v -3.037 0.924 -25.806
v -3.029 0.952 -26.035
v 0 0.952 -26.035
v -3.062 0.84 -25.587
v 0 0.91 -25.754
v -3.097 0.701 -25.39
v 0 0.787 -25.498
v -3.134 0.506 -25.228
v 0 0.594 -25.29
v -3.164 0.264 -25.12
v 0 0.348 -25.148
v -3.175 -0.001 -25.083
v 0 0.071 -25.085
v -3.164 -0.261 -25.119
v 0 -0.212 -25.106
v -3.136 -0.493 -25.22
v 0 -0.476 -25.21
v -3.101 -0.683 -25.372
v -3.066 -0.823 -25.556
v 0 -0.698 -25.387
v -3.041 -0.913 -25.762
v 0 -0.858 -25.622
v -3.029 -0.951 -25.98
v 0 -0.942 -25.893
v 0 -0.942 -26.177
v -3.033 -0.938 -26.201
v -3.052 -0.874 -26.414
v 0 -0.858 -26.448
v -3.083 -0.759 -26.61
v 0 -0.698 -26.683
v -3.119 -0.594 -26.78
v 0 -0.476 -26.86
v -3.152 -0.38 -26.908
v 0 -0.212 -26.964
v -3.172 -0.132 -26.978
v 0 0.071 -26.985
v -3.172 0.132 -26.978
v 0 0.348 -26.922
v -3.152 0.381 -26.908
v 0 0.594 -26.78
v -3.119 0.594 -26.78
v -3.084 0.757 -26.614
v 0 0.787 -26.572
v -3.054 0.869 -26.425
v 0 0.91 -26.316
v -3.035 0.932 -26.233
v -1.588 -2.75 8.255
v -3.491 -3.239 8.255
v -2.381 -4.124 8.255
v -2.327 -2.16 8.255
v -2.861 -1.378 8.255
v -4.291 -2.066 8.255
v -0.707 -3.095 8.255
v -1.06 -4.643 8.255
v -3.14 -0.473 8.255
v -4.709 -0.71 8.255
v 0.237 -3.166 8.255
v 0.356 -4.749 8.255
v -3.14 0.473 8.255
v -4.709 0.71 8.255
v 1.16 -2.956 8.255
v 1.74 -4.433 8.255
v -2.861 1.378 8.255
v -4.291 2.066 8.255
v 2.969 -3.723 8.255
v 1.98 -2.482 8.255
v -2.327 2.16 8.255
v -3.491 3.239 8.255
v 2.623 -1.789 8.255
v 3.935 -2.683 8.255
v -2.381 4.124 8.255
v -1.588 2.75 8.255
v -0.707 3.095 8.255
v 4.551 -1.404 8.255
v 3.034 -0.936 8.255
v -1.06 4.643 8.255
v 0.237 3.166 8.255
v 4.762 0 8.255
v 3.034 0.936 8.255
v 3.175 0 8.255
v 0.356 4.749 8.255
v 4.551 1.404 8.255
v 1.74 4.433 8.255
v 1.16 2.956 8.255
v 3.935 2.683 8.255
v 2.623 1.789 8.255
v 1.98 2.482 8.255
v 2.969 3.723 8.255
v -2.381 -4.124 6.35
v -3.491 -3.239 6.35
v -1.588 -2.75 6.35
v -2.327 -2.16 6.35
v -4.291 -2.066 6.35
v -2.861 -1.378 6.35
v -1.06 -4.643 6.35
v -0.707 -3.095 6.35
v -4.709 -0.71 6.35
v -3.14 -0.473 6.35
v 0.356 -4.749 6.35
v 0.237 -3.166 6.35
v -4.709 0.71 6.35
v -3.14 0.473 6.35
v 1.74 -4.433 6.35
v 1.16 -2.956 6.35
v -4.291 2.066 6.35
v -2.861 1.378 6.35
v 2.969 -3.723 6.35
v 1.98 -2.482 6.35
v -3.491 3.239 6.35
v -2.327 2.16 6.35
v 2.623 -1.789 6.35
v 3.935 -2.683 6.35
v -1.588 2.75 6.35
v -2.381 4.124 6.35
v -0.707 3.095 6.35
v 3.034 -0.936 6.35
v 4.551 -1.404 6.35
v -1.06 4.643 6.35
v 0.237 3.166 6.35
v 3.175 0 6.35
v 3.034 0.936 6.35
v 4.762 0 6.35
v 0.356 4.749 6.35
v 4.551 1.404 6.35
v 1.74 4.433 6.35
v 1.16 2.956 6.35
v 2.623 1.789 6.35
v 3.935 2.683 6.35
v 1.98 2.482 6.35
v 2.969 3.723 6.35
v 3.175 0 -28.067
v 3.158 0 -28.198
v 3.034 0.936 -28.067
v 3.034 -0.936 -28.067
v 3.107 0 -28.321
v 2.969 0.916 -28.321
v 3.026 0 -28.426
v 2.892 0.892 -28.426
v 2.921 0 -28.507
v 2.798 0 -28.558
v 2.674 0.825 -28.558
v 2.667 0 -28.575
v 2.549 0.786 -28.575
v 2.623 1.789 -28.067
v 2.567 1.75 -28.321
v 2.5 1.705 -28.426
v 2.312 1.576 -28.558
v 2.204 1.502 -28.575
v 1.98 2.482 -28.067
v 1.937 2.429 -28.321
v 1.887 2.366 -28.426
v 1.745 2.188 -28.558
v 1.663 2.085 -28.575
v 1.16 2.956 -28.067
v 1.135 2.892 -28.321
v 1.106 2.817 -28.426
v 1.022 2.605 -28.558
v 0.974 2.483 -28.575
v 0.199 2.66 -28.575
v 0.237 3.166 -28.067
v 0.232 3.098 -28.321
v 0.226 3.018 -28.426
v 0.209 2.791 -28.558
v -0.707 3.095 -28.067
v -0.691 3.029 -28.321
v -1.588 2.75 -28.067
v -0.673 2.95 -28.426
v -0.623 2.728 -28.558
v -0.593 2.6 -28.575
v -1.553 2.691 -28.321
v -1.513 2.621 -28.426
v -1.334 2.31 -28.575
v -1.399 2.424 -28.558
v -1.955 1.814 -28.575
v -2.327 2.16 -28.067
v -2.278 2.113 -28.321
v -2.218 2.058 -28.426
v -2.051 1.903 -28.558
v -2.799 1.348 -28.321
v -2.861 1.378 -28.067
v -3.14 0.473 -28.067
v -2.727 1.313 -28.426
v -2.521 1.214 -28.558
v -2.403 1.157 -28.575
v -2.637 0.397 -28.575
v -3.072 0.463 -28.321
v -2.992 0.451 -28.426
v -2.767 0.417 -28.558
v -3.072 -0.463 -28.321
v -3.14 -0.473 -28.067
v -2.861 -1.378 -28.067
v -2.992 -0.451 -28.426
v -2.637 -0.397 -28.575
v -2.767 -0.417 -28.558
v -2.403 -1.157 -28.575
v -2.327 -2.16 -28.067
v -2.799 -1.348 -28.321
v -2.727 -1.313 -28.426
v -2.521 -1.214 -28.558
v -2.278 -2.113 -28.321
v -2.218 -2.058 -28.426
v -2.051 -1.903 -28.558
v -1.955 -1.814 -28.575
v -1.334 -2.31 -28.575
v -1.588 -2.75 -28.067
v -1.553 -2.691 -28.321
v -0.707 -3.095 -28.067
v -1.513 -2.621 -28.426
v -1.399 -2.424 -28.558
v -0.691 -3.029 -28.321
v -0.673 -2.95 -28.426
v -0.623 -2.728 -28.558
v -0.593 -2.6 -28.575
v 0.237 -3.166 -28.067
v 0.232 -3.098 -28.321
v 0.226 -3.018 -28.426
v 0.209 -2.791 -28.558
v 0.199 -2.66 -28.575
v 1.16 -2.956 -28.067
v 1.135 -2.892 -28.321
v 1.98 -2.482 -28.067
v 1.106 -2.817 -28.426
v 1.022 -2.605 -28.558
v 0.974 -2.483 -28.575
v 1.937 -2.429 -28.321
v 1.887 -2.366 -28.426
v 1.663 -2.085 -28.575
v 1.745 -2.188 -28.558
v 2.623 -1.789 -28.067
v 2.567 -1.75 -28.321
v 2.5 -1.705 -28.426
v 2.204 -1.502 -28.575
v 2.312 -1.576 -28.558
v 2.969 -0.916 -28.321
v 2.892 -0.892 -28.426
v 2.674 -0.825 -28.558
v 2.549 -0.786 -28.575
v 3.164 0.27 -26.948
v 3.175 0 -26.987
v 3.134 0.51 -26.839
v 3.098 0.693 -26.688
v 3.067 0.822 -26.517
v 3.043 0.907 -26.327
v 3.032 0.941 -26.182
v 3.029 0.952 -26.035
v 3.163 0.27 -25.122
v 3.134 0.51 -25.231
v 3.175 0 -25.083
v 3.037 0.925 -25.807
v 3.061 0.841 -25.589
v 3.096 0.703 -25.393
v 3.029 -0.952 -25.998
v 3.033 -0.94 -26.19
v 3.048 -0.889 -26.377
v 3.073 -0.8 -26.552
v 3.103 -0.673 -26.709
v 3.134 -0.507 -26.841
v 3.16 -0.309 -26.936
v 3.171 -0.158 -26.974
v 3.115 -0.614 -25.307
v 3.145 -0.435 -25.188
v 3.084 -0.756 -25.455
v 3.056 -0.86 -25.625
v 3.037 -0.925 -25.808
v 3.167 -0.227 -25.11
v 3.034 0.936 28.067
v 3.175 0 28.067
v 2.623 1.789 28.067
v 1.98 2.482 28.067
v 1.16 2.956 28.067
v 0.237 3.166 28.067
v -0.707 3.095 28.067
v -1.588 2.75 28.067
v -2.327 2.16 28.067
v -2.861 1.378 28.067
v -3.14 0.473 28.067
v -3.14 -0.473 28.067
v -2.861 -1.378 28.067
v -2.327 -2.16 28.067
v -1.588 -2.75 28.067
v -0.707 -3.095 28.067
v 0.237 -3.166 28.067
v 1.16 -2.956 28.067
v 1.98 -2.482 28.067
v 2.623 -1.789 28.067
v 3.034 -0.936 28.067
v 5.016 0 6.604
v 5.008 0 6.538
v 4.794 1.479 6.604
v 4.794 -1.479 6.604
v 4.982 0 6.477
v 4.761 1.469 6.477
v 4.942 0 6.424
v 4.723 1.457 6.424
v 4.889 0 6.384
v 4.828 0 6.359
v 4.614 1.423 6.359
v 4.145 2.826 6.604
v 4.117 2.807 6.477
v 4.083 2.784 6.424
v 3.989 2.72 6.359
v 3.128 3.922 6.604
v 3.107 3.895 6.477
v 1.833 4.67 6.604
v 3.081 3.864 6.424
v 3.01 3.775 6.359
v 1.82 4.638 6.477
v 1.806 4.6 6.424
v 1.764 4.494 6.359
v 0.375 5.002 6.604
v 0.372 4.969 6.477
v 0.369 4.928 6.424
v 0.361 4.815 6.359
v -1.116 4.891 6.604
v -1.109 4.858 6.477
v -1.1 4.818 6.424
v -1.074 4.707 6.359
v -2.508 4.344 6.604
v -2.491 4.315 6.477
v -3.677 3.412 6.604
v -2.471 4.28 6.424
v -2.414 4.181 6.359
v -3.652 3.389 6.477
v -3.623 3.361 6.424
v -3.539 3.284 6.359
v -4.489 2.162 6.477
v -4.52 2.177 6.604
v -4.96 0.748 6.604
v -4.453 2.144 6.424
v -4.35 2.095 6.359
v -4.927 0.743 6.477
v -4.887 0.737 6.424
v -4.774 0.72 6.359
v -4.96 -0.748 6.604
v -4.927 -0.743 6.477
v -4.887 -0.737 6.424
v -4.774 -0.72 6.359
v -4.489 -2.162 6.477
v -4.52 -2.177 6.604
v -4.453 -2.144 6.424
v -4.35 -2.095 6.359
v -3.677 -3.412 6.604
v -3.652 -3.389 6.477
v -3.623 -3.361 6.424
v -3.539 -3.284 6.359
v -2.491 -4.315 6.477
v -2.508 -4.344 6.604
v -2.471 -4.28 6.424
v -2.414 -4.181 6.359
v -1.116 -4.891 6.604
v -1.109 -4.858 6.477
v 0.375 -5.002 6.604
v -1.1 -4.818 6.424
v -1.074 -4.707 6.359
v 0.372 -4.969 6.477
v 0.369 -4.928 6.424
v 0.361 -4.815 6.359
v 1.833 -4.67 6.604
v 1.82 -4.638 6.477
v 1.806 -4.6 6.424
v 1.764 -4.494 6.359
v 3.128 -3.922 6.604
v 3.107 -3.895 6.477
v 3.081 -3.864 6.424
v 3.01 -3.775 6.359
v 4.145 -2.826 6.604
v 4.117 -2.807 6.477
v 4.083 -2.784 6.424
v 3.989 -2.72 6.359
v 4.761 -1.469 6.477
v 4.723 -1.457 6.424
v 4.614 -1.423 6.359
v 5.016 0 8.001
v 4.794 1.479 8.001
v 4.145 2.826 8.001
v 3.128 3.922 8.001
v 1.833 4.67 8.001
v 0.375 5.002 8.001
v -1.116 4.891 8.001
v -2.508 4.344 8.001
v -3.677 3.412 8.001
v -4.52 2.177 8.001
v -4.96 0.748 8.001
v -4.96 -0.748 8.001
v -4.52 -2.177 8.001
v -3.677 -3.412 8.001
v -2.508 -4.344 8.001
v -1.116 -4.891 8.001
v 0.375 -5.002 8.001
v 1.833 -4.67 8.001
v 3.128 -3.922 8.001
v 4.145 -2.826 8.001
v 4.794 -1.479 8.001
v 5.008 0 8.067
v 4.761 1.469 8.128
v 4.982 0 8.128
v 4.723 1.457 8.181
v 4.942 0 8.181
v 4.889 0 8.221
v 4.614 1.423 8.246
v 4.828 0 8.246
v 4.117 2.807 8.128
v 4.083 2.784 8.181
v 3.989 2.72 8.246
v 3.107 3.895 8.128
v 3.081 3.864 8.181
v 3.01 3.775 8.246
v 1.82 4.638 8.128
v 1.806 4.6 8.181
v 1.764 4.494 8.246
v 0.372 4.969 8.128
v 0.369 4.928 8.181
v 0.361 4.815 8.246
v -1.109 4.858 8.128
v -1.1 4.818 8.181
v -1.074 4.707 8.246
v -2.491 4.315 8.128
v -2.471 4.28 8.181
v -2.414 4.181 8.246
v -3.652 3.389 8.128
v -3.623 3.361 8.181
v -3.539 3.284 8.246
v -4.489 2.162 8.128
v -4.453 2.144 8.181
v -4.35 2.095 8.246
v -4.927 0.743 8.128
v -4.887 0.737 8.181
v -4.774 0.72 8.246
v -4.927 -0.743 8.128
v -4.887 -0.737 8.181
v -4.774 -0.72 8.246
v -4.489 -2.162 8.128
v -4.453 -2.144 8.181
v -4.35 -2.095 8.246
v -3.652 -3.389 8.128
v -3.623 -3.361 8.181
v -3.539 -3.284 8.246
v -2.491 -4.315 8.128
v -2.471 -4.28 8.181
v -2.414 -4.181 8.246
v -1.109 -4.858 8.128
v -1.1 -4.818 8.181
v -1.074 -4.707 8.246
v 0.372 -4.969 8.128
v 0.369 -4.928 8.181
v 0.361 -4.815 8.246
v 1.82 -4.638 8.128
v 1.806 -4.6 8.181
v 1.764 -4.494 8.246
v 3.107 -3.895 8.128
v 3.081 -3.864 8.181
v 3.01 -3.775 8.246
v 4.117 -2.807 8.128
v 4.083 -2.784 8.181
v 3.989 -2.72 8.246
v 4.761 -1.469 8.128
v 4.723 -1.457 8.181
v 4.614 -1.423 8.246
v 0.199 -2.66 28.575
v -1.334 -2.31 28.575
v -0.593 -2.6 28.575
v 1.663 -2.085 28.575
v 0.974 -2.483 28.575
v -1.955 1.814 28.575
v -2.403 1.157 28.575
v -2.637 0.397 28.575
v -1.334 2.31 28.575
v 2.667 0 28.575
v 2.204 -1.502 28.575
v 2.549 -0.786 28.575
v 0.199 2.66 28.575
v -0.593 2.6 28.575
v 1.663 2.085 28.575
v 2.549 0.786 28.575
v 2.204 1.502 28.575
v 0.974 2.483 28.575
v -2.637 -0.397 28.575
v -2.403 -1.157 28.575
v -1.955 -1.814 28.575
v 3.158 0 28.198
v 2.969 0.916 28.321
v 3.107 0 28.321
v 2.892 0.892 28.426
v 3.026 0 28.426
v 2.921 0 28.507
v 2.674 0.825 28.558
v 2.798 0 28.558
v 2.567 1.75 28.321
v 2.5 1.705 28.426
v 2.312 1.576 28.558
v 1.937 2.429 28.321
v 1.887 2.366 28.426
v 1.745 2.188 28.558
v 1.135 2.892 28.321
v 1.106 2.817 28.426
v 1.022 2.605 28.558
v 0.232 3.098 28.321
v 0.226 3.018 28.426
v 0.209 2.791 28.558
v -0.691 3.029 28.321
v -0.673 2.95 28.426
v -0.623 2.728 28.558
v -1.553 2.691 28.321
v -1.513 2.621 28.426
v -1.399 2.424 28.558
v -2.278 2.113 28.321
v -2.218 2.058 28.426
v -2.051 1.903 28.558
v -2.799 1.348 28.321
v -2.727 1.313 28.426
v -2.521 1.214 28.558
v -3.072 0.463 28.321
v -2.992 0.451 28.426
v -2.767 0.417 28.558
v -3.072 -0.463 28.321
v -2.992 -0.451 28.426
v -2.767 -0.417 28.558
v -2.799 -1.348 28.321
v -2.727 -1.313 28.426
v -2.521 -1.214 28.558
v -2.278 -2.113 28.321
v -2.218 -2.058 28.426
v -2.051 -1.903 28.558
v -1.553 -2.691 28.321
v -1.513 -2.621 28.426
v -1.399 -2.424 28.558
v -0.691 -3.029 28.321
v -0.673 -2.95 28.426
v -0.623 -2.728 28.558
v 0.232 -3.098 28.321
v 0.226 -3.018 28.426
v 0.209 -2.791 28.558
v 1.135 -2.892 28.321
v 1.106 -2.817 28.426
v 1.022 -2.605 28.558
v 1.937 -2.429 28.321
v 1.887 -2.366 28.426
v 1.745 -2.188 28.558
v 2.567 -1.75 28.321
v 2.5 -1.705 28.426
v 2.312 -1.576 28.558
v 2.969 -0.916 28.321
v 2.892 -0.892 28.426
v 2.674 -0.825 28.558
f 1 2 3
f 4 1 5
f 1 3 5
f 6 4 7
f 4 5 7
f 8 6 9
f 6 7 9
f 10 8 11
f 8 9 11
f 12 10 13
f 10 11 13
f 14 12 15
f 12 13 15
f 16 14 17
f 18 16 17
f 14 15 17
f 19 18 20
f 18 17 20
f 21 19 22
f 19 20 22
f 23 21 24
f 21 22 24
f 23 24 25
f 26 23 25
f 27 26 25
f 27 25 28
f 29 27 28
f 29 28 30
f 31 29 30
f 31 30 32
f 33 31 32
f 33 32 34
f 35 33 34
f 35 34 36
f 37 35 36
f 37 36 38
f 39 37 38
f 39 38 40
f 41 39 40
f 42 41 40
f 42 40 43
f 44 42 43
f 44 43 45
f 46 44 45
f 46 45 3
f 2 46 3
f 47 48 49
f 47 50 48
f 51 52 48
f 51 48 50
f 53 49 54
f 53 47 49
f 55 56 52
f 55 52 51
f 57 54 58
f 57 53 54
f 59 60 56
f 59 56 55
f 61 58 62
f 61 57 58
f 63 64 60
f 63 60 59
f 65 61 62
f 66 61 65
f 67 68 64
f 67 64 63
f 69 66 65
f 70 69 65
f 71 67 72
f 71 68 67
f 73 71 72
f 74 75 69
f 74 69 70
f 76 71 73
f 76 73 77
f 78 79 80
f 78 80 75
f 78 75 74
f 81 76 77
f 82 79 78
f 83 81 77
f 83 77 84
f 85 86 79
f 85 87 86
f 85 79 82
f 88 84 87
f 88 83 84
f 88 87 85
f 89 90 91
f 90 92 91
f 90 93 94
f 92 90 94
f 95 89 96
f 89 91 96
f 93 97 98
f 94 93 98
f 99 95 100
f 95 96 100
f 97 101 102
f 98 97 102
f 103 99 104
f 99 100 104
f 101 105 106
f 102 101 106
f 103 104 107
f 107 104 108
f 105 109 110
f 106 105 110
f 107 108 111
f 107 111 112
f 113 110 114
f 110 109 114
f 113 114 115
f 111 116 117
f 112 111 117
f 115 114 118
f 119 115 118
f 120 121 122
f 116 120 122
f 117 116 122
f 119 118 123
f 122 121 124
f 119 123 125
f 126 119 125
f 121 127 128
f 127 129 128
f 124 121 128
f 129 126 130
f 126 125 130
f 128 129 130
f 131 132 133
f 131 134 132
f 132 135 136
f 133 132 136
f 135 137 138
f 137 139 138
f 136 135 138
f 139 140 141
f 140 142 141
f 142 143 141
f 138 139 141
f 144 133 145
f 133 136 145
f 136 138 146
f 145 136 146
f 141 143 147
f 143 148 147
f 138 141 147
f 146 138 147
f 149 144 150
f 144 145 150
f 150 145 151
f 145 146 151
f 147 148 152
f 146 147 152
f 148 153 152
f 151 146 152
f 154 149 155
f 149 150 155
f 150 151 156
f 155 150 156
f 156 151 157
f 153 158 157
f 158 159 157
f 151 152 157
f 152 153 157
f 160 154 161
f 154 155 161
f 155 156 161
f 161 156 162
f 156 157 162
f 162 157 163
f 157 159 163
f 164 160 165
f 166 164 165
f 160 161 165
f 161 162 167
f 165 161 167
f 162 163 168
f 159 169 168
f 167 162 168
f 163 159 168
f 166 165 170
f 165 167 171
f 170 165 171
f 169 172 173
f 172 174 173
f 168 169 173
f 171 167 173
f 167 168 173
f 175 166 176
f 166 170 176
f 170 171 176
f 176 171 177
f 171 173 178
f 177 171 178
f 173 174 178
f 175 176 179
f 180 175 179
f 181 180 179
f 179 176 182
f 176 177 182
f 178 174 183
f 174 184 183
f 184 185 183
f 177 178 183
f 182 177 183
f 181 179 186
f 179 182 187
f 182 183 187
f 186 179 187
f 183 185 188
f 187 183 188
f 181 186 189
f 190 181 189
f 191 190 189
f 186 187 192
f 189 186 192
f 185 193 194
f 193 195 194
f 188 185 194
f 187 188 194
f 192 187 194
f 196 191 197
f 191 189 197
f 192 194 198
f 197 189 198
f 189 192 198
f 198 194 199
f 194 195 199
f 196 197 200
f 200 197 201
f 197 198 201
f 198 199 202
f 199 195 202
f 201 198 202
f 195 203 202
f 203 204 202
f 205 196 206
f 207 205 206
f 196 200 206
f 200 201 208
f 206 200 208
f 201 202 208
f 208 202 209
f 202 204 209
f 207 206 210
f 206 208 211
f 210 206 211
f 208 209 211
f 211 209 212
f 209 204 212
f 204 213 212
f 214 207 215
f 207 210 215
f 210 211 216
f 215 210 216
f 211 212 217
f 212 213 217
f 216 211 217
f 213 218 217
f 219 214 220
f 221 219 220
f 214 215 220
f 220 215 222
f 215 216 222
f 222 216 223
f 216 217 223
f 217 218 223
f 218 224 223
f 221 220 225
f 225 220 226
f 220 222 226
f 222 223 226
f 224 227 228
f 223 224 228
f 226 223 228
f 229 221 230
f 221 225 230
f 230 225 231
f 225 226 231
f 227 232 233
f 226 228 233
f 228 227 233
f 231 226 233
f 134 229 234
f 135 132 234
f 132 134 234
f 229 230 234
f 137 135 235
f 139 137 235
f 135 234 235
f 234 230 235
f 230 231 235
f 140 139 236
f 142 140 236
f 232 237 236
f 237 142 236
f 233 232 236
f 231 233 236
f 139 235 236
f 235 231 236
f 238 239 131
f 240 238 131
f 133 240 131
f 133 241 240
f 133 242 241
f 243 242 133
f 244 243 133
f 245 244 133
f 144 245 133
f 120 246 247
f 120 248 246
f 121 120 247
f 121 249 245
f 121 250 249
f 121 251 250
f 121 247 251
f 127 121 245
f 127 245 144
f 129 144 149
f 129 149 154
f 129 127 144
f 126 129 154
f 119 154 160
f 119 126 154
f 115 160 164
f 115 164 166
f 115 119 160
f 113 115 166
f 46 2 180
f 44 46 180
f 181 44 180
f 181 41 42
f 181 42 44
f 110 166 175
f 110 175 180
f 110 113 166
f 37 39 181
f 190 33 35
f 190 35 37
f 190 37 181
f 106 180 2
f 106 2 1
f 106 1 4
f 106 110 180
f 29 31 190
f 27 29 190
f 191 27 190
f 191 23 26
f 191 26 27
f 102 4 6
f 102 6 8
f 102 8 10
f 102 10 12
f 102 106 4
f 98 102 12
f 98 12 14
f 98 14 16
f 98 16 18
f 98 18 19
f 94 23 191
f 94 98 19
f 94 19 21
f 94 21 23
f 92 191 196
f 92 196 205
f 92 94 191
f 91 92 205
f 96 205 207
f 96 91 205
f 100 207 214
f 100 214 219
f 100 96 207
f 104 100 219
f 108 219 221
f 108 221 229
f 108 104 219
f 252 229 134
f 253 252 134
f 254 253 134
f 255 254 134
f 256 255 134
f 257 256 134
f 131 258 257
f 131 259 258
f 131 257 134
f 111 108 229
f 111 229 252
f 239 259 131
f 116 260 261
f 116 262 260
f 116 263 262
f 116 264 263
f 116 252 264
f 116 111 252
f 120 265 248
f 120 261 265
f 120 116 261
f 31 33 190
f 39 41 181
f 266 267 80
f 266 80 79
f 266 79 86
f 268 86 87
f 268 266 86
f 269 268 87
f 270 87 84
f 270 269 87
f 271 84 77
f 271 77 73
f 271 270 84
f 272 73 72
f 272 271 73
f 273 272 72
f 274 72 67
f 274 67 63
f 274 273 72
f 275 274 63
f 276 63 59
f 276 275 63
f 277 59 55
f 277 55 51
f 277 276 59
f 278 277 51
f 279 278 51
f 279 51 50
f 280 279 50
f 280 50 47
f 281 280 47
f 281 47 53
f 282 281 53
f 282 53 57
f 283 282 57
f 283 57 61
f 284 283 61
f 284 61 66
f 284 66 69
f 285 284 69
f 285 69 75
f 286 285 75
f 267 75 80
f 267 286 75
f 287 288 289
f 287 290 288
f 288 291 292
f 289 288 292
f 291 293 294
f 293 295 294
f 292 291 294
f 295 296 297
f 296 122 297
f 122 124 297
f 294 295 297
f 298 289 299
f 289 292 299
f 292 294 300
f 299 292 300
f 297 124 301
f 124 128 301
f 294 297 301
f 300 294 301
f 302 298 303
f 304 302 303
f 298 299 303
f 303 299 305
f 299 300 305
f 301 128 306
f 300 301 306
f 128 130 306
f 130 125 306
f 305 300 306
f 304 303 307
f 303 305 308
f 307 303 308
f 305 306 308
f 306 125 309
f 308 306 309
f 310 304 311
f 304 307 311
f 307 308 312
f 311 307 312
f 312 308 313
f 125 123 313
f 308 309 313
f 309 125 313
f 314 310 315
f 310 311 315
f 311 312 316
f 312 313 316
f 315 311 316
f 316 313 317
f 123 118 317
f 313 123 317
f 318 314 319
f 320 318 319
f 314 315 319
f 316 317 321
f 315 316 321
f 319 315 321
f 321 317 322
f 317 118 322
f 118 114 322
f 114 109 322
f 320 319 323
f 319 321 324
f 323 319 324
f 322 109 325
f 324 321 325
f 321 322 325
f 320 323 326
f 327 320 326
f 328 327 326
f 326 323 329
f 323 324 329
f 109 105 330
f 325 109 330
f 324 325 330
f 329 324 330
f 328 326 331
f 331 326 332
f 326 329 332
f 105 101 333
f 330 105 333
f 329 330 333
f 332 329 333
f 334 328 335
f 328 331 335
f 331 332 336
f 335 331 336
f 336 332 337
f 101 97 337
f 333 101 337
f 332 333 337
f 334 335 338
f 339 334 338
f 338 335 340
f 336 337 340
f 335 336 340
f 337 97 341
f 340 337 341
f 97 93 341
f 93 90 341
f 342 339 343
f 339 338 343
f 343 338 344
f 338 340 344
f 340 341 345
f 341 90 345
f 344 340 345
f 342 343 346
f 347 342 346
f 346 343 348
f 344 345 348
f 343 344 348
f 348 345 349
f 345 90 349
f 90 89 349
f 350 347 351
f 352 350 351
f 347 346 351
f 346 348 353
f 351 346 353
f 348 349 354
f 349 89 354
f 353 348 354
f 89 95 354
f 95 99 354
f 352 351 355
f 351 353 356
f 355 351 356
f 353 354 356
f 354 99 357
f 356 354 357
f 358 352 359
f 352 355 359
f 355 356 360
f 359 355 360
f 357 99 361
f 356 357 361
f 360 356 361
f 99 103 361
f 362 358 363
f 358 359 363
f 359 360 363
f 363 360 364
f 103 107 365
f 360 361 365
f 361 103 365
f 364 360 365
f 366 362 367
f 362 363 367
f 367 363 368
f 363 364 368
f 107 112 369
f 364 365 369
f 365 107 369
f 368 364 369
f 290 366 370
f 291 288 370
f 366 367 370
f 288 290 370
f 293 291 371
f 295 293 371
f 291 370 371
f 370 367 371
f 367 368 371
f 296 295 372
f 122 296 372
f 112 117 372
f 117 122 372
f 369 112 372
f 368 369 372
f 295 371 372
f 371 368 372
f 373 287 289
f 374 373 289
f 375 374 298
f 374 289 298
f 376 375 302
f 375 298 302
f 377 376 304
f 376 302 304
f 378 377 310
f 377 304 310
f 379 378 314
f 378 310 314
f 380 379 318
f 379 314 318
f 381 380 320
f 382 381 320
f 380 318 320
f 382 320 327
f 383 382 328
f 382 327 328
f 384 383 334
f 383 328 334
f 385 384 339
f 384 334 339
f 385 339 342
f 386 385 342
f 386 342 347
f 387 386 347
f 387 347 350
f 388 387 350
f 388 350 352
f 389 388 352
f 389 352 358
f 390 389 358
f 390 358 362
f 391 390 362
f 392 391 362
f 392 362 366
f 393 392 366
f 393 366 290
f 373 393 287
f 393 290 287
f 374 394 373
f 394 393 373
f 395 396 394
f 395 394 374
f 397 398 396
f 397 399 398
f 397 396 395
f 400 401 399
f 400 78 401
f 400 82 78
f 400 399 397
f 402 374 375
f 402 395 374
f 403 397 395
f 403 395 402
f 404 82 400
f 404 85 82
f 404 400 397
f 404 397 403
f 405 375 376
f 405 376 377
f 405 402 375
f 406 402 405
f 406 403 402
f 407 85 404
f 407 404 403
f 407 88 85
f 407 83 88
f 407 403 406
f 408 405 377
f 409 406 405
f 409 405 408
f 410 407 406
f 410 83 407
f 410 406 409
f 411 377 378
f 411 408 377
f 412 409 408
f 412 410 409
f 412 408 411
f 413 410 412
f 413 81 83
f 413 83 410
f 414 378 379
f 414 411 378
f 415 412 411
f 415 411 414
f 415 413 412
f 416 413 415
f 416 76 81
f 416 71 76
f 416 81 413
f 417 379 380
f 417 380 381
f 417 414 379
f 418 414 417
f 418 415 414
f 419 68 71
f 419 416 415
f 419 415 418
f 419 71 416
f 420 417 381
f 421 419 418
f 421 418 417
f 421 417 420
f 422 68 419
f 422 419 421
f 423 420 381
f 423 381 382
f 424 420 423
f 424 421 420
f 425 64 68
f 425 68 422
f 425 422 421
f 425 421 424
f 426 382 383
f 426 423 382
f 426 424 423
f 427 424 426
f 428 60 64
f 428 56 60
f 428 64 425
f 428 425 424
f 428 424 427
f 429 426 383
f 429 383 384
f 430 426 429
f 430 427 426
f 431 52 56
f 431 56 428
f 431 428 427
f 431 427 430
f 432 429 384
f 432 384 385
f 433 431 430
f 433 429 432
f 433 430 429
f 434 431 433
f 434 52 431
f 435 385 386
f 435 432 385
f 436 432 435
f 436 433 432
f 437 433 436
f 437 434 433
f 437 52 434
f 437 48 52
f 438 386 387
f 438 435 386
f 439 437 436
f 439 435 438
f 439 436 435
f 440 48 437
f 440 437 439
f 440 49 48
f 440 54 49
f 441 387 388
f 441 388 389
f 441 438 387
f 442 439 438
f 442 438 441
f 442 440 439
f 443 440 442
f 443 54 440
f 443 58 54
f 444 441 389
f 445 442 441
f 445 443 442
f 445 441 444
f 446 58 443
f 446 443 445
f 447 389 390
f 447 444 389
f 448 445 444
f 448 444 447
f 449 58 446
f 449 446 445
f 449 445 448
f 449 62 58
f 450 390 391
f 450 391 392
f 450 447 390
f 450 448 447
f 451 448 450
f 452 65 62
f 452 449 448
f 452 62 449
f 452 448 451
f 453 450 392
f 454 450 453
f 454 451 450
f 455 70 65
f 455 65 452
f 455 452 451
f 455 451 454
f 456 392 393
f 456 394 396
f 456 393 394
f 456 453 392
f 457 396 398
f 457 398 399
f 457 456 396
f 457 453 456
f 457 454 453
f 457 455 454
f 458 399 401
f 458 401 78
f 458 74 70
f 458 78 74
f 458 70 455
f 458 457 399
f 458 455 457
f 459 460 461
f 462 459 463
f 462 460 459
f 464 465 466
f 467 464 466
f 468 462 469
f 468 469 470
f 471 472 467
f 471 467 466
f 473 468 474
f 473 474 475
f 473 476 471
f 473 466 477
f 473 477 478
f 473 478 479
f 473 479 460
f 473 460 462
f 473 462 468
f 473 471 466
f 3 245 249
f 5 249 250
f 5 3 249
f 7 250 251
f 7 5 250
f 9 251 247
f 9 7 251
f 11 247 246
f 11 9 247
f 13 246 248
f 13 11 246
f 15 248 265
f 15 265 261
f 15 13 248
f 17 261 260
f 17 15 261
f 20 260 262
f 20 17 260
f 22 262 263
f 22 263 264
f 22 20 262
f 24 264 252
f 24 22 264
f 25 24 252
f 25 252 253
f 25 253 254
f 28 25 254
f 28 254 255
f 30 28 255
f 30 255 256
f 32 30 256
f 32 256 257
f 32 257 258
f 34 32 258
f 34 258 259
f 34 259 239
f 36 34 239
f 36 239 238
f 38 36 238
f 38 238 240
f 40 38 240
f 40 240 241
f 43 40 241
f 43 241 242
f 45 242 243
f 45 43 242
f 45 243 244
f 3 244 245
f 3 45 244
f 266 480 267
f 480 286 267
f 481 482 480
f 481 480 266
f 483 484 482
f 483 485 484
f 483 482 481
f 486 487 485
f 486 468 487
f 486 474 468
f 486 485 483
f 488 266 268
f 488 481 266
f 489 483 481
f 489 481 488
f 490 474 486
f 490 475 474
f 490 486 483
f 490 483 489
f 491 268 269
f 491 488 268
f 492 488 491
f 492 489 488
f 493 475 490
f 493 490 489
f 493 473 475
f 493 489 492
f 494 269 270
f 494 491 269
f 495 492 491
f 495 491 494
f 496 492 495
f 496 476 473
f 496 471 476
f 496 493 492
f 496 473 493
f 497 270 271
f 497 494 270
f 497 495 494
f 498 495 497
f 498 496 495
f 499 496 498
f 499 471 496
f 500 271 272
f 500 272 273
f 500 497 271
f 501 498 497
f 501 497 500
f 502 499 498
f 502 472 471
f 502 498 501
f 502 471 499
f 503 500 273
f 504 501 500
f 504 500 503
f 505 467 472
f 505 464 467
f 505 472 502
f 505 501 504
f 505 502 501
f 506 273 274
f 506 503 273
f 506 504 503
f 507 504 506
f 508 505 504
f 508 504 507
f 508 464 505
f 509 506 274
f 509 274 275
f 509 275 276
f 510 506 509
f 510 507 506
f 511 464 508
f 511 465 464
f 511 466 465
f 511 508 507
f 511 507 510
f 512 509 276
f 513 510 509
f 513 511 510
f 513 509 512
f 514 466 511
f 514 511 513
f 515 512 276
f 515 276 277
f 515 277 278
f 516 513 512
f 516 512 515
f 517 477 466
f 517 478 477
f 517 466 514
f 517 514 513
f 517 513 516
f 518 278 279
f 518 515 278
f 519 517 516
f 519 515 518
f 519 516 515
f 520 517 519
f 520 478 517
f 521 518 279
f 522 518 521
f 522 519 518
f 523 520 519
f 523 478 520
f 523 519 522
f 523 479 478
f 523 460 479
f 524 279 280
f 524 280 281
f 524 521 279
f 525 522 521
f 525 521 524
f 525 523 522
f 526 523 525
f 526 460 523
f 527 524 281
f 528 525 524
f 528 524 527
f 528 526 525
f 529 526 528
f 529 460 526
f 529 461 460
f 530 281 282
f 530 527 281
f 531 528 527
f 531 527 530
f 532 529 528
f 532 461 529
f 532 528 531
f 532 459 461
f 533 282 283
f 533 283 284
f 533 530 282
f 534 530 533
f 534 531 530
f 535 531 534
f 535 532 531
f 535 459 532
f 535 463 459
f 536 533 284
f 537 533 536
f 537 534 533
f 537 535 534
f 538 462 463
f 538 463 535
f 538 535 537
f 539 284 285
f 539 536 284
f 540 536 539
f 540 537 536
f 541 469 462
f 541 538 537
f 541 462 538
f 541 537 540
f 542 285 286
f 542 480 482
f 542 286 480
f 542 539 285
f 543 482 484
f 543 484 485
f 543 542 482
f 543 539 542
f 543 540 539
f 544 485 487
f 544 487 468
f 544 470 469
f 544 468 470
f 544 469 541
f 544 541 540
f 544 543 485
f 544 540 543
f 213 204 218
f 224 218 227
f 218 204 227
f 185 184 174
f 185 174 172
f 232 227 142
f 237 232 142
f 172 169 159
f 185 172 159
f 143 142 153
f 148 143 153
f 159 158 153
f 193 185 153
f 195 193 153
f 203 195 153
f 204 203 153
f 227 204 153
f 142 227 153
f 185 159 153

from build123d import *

# Parameters (mm, degrees)
F0_R          = 3.175
F1_DEPTH      = 28.575
F3_R          = 5.0165
F4_DEPTH      = 1.905
F5_R          = 0.254
F6_R          = 0.9525
F7_DEPTH      = 5.0175
F7_DEPTH_BACK = 25.4
F8_R          = 0.508


with BuildPart() as f1:
    # F0 (on Top) → F1 (new body, symmetric)
    with BuildSketch(Plane.XY):
        Circle(F0_R)
    extrude(amount=F1_DEPTH, both=True)

    # F3 (on offset) → F4 (join)
    with BuildSketch(Plane.XY.offset(6.35)):
        Circle(F3_R)
    extrude(amount=F4_DEPTH)

    # F5
    f5_edges = [f1.edges().sort_by_distance(p)[0] for p in [
        (-5.0165, 0, 8.255),
        (-5.0165, 0, 6.35),
    ]]
    fillet(f5_edges, radius=F5_R)

    # F6 (on Right) → F7 (cut, two sides)
    with BuildSketch(Plane.YZ) as f7_sk:
        with Locations((0, -26.035)):
            Circle(F6_R)
    extrude(amount=-F7_DEPTH, mode=Mode.SUBTRACT)
    extrude(f7_sk.sketch, amount=F7_DEPTH_BACK, mode=Mode.SUBTRACT)

    # F8
    f8_edges = [f1.edges().sort_by_distance(p)[0] for p in [
        (-3.175, 0, 28.575),
        (-3.175, 0, -28.575),
    ]]
    fillet(f8_edges, radius=F8_R)


solid = f1.part
